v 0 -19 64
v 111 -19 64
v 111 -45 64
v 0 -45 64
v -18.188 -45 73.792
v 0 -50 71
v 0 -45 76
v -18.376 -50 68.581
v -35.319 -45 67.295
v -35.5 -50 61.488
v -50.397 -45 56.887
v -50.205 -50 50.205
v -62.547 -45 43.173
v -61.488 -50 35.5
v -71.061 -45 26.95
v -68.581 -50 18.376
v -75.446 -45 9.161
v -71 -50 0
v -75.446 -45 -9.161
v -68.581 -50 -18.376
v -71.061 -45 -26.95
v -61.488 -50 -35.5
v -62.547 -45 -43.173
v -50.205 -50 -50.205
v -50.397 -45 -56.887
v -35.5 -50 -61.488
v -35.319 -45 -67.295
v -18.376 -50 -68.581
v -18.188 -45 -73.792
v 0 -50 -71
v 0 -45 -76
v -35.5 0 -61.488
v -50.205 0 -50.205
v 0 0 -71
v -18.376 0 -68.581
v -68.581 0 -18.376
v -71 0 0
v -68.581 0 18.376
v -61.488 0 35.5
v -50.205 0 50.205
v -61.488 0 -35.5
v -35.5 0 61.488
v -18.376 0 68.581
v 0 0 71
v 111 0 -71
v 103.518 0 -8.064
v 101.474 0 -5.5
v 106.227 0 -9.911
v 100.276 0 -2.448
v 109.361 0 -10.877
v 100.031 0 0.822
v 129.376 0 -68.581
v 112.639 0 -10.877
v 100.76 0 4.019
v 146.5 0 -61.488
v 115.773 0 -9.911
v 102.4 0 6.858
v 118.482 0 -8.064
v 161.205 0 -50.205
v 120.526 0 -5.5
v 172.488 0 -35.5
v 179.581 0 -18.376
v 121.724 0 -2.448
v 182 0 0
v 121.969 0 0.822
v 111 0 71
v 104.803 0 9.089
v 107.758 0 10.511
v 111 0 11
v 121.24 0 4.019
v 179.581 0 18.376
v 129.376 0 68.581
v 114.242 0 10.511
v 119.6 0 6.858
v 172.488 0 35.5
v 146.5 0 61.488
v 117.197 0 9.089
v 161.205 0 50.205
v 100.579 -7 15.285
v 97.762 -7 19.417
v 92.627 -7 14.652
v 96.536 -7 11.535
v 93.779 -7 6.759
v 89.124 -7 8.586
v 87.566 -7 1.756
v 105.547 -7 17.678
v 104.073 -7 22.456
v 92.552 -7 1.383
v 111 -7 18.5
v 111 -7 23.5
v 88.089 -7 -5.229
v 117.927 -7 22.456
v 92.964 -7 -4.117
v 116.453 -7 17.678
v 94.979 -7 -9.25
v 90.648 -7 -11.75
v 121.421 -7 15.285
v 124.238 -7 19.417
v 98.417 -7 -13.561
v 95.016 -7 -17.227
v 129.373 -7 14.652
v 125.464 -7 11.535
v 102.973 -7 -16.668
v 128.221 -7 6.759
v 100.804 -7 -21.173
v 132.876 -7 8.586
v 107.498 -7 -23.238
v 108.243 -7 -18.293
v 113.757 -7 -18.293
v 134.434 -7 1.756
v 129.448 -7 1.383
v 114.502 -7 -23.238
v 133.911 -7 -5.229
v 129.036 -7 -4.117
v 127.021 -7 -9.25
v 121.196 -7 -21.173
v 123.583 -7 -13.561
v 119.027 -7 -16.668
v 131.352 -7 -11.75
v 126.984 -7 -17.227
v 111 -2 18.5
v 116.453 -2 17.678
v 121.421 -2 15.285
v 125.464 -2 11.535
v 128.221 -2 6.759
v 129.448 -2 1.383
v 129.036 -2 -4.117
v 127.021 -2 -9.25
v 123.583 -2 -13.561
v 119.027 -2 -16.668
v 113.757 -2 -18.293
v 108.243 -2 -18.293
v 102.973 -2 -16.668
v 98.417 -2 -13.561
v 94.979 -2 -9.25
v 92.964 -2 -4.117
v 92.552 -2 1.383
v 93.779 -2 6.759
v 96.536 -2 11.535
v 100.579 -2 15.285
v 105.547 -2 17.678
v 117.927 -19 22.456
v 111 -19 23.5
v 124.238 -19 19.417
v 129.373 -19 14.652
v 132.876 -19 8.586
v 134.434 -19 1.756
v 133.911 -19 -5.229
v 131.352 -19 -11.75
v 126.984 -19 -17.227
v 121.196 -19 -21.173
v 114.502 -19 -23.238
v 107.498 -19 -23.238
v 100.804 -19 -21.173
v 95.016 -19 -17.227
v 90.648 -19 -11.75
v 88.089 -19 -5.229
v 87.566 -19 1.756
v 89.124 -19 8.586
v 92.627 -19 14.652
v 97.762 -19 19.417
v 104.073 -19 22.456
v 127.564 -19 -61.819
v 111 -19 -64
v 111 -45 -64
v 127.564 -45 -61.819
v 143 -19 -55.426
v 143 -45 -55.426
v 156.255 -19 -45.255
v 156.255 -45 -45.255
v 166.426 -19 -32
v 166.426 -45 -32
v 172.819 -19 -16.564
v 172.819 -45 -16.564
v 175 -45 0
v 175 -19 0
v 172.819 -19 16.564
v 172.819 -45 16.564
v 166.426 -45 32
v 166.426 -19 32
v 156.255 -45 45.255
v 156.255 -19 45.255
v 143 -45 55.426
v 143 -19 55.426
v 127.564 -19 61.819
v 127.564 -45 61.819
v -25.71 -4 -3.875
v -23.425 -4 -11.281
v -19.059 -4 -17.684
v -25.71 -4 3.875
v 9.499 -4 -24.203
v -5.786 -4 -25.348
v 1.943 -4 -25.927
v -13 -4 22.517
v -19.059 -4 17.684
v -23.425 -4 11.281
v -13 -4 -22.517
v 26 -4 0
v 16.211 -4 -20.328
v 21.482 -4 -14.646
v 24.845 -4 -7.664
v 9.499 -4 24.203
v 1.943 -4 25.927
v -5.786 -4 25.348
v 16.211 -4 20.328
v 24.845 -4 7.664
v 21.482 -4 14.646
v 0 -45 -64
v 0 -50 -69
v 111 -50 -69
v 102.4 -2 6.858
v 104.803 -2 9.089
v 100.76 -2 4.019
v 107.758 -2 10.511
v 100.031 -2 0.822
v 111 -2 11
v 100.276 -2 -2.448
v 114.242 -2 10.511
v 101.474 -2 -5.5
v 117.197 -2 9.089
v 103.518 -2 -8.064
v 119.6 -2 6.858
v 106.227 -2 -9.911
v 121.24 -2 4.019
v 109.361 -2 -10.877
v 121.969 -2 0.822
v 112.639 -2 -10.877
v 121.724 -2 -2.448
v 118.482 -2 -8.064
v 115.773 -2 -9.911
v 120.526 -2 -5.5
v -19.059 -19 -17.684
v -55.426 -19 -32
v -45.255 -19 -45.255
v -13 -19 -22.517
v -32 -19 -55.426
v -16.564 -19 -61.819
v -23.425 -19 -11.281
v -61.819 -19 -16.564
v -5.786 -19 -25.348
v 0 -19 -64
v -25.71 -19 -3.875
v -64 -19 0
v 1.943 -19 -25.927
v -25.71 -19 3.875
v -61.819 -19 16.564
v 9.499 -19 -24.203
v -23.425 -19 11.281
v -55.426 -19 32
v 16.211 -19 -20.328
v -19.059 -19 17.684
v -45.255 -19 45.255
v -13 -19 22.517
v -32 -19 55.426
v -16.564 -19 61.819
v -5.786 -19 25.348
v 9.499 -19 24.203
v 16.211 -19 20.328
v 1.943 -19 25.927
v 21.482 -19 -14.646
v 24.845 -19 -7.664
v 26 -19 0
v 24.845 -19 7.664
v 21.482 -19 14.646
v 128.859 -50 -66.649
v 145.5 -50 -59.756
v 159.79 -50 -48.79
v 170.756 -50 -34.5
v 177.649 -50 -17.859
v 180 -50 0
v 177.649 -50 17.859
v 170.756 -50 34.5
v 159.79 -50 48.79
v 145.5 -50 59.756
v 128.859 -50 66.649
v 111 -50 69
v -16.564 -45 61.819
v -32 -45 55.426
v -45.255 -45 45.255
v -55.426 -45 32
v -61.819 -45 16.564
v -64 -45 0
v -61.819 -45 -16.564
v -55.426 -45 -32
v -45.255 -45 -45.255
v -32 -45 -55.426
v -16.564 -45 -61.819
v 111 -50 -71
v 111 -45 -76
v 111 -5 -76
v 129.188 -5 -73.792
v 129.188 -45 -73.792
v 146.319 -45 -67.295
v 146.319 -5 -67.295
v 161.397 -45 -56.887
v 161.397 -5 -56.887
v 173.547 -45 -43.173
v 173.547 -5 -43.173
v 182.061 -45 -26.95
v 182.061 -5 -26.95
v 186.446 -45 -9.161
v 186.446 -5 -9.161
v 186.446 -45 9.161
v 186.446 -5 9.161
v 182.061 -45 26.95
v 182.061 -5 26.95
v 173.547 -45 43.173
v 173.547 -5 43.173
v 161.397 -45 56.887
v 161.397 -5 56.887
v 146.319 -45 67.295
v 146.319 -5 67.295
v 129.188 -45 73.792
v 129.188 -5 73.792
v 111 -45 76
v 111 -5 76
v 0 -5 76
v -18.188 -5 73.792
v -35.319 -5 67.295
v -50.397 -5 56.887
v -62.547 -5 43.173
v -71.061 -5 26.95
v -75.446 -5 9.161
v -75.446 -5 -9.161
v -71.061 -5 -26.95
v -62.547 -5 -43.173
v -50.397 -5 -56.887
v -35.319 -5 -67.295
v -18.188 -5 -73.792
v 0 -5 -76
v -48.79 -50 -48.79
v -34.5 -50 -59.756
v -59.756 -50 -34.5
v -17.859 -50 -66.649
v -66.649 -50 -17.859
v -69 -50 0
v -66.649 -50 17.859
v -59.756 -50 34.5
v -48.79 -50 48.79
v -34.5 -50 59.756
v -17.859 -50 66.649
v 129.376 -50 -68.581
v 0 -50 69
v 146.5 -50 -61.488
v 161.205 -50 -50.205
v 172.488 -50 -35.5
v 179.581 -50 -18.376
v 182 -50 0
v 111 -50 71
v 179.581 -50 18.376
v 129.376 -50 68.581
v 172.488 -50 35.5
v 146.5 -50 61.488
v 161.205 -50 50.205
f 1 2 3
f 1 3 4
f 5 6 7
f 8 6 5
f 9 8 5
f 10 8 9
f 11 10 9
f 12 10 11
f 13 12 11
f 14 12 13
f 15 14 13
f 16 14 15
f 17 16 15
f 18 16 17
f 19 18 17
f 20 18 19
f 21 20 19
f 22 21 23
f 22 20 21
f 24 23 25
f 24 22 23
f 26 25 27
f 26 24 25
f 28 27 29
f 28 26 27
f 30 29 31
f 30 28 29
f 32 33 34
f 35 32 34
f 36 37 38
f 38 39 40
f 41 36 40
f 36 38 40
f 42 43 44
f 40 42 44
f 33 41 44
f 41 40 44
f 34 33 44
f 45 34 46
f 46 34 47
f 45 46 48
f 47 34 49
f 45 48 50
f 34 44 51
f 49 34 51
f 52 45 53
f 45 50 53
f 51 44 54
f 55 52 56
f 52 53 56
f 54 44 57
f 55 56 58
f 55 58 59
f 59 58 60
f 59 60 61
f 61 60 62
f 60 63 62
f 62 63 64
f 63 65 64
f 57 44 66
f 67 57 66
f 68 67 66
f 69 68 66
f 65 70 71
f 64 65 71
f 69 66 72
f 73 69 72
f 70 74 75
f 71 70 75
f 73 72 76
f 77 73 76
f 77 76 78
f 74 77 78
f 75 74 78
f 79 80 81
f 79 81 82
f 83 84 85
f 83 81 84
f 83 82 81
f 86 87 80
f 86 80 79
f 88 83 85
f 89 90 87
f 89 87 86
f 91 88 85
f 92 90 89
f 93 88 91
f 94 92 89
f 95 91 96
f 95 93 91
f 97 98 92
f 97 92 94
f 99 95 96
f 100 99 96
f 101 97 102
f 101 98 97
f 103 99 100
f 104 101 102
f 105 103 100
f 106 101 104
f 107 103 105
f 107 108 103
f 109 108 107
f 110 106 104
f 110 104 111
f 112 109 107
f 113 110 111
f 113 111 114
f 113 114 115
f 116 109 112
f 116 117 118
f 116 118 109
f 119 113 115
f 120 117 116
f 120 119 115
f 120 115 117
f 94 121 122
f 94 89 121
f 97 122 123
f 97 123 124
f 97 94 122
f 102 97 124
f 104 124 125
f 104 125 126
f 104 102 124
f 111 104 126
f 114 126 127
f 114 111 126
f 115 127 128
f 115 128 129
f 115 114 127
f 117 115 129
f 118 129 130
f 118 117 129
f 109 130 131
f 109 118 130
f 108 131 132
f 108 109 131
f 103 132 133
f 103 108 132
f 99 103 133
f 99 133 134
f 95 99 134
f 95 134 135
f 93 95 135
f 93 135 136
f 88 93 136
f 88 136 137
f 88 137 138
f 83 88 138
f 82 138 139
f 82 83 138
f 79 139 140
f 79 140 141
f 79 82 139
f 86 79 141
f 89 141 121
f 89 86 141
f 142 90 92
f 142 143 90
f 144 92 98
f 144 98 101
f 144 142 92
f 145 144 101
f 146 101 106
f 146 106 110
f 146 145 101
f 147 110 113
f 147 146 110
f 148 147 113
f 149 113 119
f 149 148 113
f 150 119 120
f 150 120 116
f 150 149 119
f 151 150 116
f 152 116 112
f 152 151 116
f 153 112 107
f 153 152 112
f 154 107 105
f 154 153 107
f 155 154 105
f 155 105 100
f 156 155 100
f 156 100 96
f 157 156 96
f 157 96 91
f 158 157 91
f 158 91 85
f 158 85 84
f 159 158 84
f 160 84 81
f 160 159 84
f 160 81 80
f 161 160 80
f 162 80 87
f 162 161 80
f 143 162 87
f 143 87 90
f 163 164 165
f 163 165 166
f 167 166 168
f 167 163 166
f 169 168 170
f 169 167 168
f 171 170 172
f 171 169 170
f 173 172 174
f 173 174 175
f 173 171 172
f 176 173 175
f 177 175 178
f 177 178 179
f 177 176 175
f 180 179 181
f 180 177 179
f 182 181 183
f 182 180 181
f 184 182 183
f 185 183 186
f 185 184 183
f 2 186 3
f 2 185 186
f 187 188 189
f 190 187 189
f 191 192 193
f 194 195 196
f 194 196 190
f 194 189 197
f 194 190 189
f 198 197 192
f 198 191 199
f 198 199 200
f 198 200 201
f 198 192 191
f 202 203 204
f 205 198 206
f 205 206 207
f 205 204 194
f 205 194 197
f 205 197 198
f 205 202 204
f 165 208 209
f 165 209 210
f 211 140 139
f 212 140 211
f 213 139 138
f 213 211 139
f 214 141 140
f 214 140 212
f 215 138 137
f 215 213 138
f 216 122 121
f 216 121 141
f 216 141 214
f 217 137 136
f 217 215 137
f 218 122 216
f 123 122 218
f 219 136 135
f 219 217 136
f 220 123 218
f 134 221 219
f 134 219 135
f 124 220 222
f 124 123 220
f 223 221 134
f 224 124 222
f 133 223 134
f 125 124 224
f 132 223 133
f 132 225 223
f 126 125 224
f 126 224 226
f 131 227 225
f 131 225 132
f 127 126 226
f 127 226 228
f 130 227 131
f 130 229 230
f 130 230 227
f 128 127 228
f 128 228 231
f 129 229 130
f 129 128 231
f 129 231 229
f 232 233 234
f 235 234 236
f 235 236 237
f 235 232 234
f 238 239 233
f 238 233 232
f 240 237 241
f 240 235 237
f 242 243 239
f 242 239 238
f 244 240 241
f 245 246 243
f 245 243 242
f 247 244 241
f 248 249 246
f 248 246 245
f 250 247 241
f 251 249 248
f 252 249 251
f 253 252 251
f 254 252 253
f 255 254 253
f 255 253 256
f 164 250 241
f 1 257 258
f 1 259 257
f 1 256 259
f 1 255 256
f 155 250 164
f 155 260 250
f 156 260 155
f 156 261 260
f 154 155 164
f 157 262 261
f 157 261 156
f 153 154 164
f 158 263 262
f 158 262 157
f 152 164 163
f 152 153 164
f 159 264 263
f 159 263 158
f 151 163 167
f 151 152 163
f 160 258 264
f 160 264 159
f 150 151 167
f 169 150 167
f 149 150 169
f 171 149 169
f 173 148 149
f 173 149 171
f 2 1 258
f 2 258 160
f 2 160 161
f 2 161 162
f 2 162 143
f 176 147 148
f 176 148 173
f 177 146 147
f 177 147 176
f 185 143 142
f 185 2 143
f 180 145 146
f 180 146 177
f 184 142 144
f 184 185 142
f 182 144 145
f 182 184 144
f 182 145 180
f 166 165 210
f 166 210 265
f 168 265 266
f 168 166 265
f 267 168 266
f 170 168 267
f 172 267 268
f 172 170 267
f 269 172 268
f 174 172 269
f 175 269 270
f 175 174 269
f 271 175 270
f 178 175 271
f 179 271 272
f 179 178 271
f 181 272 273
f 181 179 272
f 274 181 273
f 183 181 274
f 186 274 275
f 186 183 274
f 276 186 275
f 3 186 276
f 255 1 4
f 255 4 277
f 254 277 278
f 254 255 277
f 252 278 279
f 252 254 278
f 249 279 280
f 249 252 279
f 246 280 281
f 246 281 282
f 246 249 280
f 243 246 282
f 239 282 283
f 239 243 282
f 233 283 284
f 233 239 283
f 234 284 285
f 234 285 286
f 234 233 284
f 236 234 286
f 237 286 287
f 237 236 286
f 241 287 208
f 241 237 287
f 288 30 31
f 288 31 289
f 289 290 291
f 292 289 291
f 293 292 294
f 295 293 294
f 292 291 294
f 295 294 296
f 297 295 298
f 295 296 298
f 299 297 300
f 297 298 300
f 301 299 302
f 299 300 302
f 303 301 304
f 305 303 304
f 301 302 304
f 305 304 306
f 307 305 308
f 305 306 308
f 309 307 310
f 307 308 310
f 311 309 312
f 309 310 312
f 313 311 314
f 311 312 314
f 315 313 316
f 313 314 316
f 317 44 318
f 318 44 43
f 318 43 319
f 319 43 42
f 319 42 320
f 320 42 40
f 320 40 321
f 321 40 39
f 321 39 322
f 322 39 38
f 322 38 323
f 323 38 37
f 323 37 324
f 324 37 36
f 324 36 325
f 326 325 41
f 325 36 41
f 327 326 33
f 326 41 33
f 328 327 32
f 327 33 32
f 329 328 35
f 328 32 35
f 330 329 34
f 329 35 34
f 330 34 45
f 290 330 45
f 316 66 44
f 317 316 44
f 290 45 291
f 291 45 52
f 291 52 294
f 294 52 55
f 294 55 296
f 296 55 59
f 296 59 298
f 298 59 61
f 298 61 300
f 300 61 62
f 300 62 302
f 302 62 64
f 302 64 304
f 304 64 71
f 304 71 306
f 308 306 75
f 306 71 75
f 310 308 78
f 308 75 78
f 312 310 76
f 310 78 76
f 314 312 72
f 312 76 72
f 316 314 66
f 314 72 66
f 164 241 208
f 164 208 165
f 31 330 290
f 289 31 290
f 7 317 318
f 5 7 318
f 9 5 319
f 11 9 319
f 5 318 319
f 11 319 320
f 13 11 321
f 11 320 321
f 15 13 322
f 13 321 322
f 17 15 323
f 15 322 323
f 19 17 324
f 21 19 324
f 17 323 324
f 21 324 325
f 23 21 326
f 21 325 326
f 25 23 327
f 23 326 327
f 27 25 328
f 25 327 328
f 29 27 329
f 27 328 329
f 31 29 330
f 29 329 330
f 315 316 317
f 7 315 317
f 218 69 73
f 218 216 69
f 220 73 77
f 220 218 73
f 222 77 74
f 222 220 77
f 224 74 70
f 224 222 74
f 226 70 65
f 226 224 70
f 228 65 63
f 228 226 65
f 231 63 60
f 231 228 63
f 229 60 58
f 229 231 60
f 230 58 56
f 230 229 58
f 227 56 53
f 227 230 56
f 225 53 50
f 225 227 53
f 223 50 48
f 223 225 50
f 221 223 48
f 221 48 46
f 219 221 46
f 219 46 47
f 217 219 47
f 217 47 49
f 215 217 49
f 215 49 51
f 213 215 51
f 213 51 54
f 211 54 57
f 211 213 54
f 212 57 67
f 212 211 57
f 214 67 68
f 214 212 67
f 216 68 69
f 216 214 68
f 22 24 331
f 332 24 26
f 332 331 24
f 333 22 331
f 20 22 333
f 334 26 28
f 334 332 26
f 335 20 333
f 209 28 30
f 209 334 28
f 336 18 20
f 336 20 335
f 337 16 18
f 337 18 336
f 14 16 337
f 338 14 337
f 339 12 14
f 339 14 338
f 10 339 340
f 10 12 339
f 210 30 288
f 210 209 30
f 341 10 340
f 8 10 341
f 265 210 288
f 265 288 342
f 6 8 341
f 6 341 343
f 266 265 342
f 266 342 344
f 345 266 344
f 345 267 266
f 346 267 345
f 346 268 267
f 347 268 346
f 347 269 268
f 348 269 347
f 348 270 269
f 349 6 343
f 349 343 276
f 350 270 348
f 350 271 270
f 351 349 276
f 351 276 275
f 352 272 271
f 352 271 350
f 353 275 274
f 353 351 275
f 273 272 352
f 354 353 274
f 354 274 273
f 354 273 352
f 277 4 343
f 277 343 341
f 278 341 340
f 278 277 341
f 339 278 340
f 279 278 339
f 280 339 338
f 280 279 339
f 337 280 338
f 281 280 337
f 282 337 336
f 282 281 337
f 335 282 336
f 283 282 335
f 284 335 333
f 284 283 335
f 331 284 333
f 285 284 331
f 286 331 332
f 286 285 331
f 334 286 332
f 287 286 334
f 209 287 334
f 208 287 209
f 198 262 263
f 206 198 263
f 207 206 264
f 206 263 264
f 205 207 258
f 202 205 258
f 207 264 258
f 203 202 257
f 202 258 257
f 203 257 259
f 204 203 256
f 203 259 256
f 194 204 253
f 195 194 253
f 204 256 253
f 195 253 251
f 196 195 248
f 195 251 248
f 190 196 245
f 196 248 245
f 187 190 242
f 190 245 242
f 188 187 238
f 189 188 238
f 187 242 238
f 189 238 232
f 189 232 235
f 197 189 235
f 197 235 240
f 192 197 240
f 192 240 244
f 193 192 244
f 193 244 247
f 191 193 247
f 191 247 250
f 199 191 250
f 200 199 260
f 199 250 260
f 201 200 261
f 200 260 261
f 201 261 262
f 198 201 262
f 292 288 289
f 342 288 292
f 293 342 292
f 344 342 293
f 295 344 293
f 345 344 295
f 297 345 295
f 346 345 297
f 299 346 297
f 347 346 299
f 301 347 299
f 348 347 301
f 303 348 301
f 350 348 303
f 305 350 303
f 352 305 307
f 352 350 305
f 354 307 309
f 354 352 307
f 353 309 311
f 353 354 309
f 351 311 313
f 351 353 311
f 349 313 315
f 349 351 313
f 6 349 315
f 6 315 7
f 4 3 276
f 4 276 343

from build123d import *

# Parameters (mm, degrees)
F1_DEPTH = 50
F4_DEPTH = 60
F5_R     = 26
F6_DEPTH = 15
F10_SIZE = 5
F11_SIZE = 5
F12_SIZE = 5


with BuildPart() as f1:
    # F0 (on Front) → F1 (new body)
    with BuildSketch(Plane.XZ):
        with BuildLine():
            Line((111, 76), (0, 76))
            ThreePointArc((0, 76), (-76, 0), (0, -76))
            Line((0, -76), (111, -76))
            ThreePointArc((111, -76), (187, 0), (111, 76))
        make_face()
    extrude(amount=F1_DEPTH)

    # F3 (on offset) + F1_face (on face) → F4 (cut)
    with BuildSketch(Plane.XZ.offset(19)):
        with BuildLine():
            Line((111, 64), (0, 64))
            ThreePointArc((0, 64), (-64, 0), (0, -64))
            Line((0, -64), (111, -64))
            ThreePointArc((111, -64), (175, 0), (111, 64))
        make_face()
    with BuildSketch(Plane(origin=(55.5, -50, 0), x_dir=(1, 0, 0), z_dir=(0, -1, 0))):
        with BuildLine():
            Line((55.5, 76), (-55.5, 76))
            ThreePointArc((-55.5, 76), (-131.5, 0), (-55.5, -76))
            Line((-55.5, -76), (55.5, -76))
            ThreePointArc((55.5, -76), (131.5, 0), (55.5, 76))
        make_face()
    extrude(amount=F4_DEPTH, mode=Mode.SUBTRACT)

    # F5 (on offset) → F6 (cut)
    with BuildSketch(Plane.XZ.offset(19)):
        Circle(F5_R)
    extrude(amount=-F6_DEPTH, mode=Mode.SUBTRACT)

    # F8 (on offset) → F9 (revolve, cut)
    with BuildSketch(Plane.YZ.offset(111)):
        Polygon((0, 0), (0, 11), (-2, 11), (-2, 18.5), (-7, 18.5), (-7, 23.5), (-19, 23.5), (-19, 0), align=None)
    revolve(axis=Axis((111, -9.5, 0), (0, 1, 0)), mode=Mode.SUBTRACT)

    # F10
    f10_edges = [f1.edges().sort_by_distance(p)[0] for p in [
        (55.5, 0, 76),
        (187, 0, 0),
        (-76, 0, 0),
        (55.5, 0, -76),
    ]]
    chamfer(f10_edges, length=F10_SIZE)

    # F11
    f11_edges = [f1.edges().sort_by_distance(p)[0] for p in [
        (55.5, -50, 76),
        (-76, -50, 0),
        (187, -50, 0),
        (55.5, -50, -76),
    ]]
    chamfer(f11_edges, length=F11_SIZE)

    # F12
    f12_edges = [f1.edges().sort_by_distance(p)[0] for p in [
        (55.5, -50, 64),
        (-64, -50, 0),
        (55.5, -50, -64),
        (175, -50, 0),
    ]]
    chamfer(f12_edges, length=F12_SIZE)


solid = f1.part
